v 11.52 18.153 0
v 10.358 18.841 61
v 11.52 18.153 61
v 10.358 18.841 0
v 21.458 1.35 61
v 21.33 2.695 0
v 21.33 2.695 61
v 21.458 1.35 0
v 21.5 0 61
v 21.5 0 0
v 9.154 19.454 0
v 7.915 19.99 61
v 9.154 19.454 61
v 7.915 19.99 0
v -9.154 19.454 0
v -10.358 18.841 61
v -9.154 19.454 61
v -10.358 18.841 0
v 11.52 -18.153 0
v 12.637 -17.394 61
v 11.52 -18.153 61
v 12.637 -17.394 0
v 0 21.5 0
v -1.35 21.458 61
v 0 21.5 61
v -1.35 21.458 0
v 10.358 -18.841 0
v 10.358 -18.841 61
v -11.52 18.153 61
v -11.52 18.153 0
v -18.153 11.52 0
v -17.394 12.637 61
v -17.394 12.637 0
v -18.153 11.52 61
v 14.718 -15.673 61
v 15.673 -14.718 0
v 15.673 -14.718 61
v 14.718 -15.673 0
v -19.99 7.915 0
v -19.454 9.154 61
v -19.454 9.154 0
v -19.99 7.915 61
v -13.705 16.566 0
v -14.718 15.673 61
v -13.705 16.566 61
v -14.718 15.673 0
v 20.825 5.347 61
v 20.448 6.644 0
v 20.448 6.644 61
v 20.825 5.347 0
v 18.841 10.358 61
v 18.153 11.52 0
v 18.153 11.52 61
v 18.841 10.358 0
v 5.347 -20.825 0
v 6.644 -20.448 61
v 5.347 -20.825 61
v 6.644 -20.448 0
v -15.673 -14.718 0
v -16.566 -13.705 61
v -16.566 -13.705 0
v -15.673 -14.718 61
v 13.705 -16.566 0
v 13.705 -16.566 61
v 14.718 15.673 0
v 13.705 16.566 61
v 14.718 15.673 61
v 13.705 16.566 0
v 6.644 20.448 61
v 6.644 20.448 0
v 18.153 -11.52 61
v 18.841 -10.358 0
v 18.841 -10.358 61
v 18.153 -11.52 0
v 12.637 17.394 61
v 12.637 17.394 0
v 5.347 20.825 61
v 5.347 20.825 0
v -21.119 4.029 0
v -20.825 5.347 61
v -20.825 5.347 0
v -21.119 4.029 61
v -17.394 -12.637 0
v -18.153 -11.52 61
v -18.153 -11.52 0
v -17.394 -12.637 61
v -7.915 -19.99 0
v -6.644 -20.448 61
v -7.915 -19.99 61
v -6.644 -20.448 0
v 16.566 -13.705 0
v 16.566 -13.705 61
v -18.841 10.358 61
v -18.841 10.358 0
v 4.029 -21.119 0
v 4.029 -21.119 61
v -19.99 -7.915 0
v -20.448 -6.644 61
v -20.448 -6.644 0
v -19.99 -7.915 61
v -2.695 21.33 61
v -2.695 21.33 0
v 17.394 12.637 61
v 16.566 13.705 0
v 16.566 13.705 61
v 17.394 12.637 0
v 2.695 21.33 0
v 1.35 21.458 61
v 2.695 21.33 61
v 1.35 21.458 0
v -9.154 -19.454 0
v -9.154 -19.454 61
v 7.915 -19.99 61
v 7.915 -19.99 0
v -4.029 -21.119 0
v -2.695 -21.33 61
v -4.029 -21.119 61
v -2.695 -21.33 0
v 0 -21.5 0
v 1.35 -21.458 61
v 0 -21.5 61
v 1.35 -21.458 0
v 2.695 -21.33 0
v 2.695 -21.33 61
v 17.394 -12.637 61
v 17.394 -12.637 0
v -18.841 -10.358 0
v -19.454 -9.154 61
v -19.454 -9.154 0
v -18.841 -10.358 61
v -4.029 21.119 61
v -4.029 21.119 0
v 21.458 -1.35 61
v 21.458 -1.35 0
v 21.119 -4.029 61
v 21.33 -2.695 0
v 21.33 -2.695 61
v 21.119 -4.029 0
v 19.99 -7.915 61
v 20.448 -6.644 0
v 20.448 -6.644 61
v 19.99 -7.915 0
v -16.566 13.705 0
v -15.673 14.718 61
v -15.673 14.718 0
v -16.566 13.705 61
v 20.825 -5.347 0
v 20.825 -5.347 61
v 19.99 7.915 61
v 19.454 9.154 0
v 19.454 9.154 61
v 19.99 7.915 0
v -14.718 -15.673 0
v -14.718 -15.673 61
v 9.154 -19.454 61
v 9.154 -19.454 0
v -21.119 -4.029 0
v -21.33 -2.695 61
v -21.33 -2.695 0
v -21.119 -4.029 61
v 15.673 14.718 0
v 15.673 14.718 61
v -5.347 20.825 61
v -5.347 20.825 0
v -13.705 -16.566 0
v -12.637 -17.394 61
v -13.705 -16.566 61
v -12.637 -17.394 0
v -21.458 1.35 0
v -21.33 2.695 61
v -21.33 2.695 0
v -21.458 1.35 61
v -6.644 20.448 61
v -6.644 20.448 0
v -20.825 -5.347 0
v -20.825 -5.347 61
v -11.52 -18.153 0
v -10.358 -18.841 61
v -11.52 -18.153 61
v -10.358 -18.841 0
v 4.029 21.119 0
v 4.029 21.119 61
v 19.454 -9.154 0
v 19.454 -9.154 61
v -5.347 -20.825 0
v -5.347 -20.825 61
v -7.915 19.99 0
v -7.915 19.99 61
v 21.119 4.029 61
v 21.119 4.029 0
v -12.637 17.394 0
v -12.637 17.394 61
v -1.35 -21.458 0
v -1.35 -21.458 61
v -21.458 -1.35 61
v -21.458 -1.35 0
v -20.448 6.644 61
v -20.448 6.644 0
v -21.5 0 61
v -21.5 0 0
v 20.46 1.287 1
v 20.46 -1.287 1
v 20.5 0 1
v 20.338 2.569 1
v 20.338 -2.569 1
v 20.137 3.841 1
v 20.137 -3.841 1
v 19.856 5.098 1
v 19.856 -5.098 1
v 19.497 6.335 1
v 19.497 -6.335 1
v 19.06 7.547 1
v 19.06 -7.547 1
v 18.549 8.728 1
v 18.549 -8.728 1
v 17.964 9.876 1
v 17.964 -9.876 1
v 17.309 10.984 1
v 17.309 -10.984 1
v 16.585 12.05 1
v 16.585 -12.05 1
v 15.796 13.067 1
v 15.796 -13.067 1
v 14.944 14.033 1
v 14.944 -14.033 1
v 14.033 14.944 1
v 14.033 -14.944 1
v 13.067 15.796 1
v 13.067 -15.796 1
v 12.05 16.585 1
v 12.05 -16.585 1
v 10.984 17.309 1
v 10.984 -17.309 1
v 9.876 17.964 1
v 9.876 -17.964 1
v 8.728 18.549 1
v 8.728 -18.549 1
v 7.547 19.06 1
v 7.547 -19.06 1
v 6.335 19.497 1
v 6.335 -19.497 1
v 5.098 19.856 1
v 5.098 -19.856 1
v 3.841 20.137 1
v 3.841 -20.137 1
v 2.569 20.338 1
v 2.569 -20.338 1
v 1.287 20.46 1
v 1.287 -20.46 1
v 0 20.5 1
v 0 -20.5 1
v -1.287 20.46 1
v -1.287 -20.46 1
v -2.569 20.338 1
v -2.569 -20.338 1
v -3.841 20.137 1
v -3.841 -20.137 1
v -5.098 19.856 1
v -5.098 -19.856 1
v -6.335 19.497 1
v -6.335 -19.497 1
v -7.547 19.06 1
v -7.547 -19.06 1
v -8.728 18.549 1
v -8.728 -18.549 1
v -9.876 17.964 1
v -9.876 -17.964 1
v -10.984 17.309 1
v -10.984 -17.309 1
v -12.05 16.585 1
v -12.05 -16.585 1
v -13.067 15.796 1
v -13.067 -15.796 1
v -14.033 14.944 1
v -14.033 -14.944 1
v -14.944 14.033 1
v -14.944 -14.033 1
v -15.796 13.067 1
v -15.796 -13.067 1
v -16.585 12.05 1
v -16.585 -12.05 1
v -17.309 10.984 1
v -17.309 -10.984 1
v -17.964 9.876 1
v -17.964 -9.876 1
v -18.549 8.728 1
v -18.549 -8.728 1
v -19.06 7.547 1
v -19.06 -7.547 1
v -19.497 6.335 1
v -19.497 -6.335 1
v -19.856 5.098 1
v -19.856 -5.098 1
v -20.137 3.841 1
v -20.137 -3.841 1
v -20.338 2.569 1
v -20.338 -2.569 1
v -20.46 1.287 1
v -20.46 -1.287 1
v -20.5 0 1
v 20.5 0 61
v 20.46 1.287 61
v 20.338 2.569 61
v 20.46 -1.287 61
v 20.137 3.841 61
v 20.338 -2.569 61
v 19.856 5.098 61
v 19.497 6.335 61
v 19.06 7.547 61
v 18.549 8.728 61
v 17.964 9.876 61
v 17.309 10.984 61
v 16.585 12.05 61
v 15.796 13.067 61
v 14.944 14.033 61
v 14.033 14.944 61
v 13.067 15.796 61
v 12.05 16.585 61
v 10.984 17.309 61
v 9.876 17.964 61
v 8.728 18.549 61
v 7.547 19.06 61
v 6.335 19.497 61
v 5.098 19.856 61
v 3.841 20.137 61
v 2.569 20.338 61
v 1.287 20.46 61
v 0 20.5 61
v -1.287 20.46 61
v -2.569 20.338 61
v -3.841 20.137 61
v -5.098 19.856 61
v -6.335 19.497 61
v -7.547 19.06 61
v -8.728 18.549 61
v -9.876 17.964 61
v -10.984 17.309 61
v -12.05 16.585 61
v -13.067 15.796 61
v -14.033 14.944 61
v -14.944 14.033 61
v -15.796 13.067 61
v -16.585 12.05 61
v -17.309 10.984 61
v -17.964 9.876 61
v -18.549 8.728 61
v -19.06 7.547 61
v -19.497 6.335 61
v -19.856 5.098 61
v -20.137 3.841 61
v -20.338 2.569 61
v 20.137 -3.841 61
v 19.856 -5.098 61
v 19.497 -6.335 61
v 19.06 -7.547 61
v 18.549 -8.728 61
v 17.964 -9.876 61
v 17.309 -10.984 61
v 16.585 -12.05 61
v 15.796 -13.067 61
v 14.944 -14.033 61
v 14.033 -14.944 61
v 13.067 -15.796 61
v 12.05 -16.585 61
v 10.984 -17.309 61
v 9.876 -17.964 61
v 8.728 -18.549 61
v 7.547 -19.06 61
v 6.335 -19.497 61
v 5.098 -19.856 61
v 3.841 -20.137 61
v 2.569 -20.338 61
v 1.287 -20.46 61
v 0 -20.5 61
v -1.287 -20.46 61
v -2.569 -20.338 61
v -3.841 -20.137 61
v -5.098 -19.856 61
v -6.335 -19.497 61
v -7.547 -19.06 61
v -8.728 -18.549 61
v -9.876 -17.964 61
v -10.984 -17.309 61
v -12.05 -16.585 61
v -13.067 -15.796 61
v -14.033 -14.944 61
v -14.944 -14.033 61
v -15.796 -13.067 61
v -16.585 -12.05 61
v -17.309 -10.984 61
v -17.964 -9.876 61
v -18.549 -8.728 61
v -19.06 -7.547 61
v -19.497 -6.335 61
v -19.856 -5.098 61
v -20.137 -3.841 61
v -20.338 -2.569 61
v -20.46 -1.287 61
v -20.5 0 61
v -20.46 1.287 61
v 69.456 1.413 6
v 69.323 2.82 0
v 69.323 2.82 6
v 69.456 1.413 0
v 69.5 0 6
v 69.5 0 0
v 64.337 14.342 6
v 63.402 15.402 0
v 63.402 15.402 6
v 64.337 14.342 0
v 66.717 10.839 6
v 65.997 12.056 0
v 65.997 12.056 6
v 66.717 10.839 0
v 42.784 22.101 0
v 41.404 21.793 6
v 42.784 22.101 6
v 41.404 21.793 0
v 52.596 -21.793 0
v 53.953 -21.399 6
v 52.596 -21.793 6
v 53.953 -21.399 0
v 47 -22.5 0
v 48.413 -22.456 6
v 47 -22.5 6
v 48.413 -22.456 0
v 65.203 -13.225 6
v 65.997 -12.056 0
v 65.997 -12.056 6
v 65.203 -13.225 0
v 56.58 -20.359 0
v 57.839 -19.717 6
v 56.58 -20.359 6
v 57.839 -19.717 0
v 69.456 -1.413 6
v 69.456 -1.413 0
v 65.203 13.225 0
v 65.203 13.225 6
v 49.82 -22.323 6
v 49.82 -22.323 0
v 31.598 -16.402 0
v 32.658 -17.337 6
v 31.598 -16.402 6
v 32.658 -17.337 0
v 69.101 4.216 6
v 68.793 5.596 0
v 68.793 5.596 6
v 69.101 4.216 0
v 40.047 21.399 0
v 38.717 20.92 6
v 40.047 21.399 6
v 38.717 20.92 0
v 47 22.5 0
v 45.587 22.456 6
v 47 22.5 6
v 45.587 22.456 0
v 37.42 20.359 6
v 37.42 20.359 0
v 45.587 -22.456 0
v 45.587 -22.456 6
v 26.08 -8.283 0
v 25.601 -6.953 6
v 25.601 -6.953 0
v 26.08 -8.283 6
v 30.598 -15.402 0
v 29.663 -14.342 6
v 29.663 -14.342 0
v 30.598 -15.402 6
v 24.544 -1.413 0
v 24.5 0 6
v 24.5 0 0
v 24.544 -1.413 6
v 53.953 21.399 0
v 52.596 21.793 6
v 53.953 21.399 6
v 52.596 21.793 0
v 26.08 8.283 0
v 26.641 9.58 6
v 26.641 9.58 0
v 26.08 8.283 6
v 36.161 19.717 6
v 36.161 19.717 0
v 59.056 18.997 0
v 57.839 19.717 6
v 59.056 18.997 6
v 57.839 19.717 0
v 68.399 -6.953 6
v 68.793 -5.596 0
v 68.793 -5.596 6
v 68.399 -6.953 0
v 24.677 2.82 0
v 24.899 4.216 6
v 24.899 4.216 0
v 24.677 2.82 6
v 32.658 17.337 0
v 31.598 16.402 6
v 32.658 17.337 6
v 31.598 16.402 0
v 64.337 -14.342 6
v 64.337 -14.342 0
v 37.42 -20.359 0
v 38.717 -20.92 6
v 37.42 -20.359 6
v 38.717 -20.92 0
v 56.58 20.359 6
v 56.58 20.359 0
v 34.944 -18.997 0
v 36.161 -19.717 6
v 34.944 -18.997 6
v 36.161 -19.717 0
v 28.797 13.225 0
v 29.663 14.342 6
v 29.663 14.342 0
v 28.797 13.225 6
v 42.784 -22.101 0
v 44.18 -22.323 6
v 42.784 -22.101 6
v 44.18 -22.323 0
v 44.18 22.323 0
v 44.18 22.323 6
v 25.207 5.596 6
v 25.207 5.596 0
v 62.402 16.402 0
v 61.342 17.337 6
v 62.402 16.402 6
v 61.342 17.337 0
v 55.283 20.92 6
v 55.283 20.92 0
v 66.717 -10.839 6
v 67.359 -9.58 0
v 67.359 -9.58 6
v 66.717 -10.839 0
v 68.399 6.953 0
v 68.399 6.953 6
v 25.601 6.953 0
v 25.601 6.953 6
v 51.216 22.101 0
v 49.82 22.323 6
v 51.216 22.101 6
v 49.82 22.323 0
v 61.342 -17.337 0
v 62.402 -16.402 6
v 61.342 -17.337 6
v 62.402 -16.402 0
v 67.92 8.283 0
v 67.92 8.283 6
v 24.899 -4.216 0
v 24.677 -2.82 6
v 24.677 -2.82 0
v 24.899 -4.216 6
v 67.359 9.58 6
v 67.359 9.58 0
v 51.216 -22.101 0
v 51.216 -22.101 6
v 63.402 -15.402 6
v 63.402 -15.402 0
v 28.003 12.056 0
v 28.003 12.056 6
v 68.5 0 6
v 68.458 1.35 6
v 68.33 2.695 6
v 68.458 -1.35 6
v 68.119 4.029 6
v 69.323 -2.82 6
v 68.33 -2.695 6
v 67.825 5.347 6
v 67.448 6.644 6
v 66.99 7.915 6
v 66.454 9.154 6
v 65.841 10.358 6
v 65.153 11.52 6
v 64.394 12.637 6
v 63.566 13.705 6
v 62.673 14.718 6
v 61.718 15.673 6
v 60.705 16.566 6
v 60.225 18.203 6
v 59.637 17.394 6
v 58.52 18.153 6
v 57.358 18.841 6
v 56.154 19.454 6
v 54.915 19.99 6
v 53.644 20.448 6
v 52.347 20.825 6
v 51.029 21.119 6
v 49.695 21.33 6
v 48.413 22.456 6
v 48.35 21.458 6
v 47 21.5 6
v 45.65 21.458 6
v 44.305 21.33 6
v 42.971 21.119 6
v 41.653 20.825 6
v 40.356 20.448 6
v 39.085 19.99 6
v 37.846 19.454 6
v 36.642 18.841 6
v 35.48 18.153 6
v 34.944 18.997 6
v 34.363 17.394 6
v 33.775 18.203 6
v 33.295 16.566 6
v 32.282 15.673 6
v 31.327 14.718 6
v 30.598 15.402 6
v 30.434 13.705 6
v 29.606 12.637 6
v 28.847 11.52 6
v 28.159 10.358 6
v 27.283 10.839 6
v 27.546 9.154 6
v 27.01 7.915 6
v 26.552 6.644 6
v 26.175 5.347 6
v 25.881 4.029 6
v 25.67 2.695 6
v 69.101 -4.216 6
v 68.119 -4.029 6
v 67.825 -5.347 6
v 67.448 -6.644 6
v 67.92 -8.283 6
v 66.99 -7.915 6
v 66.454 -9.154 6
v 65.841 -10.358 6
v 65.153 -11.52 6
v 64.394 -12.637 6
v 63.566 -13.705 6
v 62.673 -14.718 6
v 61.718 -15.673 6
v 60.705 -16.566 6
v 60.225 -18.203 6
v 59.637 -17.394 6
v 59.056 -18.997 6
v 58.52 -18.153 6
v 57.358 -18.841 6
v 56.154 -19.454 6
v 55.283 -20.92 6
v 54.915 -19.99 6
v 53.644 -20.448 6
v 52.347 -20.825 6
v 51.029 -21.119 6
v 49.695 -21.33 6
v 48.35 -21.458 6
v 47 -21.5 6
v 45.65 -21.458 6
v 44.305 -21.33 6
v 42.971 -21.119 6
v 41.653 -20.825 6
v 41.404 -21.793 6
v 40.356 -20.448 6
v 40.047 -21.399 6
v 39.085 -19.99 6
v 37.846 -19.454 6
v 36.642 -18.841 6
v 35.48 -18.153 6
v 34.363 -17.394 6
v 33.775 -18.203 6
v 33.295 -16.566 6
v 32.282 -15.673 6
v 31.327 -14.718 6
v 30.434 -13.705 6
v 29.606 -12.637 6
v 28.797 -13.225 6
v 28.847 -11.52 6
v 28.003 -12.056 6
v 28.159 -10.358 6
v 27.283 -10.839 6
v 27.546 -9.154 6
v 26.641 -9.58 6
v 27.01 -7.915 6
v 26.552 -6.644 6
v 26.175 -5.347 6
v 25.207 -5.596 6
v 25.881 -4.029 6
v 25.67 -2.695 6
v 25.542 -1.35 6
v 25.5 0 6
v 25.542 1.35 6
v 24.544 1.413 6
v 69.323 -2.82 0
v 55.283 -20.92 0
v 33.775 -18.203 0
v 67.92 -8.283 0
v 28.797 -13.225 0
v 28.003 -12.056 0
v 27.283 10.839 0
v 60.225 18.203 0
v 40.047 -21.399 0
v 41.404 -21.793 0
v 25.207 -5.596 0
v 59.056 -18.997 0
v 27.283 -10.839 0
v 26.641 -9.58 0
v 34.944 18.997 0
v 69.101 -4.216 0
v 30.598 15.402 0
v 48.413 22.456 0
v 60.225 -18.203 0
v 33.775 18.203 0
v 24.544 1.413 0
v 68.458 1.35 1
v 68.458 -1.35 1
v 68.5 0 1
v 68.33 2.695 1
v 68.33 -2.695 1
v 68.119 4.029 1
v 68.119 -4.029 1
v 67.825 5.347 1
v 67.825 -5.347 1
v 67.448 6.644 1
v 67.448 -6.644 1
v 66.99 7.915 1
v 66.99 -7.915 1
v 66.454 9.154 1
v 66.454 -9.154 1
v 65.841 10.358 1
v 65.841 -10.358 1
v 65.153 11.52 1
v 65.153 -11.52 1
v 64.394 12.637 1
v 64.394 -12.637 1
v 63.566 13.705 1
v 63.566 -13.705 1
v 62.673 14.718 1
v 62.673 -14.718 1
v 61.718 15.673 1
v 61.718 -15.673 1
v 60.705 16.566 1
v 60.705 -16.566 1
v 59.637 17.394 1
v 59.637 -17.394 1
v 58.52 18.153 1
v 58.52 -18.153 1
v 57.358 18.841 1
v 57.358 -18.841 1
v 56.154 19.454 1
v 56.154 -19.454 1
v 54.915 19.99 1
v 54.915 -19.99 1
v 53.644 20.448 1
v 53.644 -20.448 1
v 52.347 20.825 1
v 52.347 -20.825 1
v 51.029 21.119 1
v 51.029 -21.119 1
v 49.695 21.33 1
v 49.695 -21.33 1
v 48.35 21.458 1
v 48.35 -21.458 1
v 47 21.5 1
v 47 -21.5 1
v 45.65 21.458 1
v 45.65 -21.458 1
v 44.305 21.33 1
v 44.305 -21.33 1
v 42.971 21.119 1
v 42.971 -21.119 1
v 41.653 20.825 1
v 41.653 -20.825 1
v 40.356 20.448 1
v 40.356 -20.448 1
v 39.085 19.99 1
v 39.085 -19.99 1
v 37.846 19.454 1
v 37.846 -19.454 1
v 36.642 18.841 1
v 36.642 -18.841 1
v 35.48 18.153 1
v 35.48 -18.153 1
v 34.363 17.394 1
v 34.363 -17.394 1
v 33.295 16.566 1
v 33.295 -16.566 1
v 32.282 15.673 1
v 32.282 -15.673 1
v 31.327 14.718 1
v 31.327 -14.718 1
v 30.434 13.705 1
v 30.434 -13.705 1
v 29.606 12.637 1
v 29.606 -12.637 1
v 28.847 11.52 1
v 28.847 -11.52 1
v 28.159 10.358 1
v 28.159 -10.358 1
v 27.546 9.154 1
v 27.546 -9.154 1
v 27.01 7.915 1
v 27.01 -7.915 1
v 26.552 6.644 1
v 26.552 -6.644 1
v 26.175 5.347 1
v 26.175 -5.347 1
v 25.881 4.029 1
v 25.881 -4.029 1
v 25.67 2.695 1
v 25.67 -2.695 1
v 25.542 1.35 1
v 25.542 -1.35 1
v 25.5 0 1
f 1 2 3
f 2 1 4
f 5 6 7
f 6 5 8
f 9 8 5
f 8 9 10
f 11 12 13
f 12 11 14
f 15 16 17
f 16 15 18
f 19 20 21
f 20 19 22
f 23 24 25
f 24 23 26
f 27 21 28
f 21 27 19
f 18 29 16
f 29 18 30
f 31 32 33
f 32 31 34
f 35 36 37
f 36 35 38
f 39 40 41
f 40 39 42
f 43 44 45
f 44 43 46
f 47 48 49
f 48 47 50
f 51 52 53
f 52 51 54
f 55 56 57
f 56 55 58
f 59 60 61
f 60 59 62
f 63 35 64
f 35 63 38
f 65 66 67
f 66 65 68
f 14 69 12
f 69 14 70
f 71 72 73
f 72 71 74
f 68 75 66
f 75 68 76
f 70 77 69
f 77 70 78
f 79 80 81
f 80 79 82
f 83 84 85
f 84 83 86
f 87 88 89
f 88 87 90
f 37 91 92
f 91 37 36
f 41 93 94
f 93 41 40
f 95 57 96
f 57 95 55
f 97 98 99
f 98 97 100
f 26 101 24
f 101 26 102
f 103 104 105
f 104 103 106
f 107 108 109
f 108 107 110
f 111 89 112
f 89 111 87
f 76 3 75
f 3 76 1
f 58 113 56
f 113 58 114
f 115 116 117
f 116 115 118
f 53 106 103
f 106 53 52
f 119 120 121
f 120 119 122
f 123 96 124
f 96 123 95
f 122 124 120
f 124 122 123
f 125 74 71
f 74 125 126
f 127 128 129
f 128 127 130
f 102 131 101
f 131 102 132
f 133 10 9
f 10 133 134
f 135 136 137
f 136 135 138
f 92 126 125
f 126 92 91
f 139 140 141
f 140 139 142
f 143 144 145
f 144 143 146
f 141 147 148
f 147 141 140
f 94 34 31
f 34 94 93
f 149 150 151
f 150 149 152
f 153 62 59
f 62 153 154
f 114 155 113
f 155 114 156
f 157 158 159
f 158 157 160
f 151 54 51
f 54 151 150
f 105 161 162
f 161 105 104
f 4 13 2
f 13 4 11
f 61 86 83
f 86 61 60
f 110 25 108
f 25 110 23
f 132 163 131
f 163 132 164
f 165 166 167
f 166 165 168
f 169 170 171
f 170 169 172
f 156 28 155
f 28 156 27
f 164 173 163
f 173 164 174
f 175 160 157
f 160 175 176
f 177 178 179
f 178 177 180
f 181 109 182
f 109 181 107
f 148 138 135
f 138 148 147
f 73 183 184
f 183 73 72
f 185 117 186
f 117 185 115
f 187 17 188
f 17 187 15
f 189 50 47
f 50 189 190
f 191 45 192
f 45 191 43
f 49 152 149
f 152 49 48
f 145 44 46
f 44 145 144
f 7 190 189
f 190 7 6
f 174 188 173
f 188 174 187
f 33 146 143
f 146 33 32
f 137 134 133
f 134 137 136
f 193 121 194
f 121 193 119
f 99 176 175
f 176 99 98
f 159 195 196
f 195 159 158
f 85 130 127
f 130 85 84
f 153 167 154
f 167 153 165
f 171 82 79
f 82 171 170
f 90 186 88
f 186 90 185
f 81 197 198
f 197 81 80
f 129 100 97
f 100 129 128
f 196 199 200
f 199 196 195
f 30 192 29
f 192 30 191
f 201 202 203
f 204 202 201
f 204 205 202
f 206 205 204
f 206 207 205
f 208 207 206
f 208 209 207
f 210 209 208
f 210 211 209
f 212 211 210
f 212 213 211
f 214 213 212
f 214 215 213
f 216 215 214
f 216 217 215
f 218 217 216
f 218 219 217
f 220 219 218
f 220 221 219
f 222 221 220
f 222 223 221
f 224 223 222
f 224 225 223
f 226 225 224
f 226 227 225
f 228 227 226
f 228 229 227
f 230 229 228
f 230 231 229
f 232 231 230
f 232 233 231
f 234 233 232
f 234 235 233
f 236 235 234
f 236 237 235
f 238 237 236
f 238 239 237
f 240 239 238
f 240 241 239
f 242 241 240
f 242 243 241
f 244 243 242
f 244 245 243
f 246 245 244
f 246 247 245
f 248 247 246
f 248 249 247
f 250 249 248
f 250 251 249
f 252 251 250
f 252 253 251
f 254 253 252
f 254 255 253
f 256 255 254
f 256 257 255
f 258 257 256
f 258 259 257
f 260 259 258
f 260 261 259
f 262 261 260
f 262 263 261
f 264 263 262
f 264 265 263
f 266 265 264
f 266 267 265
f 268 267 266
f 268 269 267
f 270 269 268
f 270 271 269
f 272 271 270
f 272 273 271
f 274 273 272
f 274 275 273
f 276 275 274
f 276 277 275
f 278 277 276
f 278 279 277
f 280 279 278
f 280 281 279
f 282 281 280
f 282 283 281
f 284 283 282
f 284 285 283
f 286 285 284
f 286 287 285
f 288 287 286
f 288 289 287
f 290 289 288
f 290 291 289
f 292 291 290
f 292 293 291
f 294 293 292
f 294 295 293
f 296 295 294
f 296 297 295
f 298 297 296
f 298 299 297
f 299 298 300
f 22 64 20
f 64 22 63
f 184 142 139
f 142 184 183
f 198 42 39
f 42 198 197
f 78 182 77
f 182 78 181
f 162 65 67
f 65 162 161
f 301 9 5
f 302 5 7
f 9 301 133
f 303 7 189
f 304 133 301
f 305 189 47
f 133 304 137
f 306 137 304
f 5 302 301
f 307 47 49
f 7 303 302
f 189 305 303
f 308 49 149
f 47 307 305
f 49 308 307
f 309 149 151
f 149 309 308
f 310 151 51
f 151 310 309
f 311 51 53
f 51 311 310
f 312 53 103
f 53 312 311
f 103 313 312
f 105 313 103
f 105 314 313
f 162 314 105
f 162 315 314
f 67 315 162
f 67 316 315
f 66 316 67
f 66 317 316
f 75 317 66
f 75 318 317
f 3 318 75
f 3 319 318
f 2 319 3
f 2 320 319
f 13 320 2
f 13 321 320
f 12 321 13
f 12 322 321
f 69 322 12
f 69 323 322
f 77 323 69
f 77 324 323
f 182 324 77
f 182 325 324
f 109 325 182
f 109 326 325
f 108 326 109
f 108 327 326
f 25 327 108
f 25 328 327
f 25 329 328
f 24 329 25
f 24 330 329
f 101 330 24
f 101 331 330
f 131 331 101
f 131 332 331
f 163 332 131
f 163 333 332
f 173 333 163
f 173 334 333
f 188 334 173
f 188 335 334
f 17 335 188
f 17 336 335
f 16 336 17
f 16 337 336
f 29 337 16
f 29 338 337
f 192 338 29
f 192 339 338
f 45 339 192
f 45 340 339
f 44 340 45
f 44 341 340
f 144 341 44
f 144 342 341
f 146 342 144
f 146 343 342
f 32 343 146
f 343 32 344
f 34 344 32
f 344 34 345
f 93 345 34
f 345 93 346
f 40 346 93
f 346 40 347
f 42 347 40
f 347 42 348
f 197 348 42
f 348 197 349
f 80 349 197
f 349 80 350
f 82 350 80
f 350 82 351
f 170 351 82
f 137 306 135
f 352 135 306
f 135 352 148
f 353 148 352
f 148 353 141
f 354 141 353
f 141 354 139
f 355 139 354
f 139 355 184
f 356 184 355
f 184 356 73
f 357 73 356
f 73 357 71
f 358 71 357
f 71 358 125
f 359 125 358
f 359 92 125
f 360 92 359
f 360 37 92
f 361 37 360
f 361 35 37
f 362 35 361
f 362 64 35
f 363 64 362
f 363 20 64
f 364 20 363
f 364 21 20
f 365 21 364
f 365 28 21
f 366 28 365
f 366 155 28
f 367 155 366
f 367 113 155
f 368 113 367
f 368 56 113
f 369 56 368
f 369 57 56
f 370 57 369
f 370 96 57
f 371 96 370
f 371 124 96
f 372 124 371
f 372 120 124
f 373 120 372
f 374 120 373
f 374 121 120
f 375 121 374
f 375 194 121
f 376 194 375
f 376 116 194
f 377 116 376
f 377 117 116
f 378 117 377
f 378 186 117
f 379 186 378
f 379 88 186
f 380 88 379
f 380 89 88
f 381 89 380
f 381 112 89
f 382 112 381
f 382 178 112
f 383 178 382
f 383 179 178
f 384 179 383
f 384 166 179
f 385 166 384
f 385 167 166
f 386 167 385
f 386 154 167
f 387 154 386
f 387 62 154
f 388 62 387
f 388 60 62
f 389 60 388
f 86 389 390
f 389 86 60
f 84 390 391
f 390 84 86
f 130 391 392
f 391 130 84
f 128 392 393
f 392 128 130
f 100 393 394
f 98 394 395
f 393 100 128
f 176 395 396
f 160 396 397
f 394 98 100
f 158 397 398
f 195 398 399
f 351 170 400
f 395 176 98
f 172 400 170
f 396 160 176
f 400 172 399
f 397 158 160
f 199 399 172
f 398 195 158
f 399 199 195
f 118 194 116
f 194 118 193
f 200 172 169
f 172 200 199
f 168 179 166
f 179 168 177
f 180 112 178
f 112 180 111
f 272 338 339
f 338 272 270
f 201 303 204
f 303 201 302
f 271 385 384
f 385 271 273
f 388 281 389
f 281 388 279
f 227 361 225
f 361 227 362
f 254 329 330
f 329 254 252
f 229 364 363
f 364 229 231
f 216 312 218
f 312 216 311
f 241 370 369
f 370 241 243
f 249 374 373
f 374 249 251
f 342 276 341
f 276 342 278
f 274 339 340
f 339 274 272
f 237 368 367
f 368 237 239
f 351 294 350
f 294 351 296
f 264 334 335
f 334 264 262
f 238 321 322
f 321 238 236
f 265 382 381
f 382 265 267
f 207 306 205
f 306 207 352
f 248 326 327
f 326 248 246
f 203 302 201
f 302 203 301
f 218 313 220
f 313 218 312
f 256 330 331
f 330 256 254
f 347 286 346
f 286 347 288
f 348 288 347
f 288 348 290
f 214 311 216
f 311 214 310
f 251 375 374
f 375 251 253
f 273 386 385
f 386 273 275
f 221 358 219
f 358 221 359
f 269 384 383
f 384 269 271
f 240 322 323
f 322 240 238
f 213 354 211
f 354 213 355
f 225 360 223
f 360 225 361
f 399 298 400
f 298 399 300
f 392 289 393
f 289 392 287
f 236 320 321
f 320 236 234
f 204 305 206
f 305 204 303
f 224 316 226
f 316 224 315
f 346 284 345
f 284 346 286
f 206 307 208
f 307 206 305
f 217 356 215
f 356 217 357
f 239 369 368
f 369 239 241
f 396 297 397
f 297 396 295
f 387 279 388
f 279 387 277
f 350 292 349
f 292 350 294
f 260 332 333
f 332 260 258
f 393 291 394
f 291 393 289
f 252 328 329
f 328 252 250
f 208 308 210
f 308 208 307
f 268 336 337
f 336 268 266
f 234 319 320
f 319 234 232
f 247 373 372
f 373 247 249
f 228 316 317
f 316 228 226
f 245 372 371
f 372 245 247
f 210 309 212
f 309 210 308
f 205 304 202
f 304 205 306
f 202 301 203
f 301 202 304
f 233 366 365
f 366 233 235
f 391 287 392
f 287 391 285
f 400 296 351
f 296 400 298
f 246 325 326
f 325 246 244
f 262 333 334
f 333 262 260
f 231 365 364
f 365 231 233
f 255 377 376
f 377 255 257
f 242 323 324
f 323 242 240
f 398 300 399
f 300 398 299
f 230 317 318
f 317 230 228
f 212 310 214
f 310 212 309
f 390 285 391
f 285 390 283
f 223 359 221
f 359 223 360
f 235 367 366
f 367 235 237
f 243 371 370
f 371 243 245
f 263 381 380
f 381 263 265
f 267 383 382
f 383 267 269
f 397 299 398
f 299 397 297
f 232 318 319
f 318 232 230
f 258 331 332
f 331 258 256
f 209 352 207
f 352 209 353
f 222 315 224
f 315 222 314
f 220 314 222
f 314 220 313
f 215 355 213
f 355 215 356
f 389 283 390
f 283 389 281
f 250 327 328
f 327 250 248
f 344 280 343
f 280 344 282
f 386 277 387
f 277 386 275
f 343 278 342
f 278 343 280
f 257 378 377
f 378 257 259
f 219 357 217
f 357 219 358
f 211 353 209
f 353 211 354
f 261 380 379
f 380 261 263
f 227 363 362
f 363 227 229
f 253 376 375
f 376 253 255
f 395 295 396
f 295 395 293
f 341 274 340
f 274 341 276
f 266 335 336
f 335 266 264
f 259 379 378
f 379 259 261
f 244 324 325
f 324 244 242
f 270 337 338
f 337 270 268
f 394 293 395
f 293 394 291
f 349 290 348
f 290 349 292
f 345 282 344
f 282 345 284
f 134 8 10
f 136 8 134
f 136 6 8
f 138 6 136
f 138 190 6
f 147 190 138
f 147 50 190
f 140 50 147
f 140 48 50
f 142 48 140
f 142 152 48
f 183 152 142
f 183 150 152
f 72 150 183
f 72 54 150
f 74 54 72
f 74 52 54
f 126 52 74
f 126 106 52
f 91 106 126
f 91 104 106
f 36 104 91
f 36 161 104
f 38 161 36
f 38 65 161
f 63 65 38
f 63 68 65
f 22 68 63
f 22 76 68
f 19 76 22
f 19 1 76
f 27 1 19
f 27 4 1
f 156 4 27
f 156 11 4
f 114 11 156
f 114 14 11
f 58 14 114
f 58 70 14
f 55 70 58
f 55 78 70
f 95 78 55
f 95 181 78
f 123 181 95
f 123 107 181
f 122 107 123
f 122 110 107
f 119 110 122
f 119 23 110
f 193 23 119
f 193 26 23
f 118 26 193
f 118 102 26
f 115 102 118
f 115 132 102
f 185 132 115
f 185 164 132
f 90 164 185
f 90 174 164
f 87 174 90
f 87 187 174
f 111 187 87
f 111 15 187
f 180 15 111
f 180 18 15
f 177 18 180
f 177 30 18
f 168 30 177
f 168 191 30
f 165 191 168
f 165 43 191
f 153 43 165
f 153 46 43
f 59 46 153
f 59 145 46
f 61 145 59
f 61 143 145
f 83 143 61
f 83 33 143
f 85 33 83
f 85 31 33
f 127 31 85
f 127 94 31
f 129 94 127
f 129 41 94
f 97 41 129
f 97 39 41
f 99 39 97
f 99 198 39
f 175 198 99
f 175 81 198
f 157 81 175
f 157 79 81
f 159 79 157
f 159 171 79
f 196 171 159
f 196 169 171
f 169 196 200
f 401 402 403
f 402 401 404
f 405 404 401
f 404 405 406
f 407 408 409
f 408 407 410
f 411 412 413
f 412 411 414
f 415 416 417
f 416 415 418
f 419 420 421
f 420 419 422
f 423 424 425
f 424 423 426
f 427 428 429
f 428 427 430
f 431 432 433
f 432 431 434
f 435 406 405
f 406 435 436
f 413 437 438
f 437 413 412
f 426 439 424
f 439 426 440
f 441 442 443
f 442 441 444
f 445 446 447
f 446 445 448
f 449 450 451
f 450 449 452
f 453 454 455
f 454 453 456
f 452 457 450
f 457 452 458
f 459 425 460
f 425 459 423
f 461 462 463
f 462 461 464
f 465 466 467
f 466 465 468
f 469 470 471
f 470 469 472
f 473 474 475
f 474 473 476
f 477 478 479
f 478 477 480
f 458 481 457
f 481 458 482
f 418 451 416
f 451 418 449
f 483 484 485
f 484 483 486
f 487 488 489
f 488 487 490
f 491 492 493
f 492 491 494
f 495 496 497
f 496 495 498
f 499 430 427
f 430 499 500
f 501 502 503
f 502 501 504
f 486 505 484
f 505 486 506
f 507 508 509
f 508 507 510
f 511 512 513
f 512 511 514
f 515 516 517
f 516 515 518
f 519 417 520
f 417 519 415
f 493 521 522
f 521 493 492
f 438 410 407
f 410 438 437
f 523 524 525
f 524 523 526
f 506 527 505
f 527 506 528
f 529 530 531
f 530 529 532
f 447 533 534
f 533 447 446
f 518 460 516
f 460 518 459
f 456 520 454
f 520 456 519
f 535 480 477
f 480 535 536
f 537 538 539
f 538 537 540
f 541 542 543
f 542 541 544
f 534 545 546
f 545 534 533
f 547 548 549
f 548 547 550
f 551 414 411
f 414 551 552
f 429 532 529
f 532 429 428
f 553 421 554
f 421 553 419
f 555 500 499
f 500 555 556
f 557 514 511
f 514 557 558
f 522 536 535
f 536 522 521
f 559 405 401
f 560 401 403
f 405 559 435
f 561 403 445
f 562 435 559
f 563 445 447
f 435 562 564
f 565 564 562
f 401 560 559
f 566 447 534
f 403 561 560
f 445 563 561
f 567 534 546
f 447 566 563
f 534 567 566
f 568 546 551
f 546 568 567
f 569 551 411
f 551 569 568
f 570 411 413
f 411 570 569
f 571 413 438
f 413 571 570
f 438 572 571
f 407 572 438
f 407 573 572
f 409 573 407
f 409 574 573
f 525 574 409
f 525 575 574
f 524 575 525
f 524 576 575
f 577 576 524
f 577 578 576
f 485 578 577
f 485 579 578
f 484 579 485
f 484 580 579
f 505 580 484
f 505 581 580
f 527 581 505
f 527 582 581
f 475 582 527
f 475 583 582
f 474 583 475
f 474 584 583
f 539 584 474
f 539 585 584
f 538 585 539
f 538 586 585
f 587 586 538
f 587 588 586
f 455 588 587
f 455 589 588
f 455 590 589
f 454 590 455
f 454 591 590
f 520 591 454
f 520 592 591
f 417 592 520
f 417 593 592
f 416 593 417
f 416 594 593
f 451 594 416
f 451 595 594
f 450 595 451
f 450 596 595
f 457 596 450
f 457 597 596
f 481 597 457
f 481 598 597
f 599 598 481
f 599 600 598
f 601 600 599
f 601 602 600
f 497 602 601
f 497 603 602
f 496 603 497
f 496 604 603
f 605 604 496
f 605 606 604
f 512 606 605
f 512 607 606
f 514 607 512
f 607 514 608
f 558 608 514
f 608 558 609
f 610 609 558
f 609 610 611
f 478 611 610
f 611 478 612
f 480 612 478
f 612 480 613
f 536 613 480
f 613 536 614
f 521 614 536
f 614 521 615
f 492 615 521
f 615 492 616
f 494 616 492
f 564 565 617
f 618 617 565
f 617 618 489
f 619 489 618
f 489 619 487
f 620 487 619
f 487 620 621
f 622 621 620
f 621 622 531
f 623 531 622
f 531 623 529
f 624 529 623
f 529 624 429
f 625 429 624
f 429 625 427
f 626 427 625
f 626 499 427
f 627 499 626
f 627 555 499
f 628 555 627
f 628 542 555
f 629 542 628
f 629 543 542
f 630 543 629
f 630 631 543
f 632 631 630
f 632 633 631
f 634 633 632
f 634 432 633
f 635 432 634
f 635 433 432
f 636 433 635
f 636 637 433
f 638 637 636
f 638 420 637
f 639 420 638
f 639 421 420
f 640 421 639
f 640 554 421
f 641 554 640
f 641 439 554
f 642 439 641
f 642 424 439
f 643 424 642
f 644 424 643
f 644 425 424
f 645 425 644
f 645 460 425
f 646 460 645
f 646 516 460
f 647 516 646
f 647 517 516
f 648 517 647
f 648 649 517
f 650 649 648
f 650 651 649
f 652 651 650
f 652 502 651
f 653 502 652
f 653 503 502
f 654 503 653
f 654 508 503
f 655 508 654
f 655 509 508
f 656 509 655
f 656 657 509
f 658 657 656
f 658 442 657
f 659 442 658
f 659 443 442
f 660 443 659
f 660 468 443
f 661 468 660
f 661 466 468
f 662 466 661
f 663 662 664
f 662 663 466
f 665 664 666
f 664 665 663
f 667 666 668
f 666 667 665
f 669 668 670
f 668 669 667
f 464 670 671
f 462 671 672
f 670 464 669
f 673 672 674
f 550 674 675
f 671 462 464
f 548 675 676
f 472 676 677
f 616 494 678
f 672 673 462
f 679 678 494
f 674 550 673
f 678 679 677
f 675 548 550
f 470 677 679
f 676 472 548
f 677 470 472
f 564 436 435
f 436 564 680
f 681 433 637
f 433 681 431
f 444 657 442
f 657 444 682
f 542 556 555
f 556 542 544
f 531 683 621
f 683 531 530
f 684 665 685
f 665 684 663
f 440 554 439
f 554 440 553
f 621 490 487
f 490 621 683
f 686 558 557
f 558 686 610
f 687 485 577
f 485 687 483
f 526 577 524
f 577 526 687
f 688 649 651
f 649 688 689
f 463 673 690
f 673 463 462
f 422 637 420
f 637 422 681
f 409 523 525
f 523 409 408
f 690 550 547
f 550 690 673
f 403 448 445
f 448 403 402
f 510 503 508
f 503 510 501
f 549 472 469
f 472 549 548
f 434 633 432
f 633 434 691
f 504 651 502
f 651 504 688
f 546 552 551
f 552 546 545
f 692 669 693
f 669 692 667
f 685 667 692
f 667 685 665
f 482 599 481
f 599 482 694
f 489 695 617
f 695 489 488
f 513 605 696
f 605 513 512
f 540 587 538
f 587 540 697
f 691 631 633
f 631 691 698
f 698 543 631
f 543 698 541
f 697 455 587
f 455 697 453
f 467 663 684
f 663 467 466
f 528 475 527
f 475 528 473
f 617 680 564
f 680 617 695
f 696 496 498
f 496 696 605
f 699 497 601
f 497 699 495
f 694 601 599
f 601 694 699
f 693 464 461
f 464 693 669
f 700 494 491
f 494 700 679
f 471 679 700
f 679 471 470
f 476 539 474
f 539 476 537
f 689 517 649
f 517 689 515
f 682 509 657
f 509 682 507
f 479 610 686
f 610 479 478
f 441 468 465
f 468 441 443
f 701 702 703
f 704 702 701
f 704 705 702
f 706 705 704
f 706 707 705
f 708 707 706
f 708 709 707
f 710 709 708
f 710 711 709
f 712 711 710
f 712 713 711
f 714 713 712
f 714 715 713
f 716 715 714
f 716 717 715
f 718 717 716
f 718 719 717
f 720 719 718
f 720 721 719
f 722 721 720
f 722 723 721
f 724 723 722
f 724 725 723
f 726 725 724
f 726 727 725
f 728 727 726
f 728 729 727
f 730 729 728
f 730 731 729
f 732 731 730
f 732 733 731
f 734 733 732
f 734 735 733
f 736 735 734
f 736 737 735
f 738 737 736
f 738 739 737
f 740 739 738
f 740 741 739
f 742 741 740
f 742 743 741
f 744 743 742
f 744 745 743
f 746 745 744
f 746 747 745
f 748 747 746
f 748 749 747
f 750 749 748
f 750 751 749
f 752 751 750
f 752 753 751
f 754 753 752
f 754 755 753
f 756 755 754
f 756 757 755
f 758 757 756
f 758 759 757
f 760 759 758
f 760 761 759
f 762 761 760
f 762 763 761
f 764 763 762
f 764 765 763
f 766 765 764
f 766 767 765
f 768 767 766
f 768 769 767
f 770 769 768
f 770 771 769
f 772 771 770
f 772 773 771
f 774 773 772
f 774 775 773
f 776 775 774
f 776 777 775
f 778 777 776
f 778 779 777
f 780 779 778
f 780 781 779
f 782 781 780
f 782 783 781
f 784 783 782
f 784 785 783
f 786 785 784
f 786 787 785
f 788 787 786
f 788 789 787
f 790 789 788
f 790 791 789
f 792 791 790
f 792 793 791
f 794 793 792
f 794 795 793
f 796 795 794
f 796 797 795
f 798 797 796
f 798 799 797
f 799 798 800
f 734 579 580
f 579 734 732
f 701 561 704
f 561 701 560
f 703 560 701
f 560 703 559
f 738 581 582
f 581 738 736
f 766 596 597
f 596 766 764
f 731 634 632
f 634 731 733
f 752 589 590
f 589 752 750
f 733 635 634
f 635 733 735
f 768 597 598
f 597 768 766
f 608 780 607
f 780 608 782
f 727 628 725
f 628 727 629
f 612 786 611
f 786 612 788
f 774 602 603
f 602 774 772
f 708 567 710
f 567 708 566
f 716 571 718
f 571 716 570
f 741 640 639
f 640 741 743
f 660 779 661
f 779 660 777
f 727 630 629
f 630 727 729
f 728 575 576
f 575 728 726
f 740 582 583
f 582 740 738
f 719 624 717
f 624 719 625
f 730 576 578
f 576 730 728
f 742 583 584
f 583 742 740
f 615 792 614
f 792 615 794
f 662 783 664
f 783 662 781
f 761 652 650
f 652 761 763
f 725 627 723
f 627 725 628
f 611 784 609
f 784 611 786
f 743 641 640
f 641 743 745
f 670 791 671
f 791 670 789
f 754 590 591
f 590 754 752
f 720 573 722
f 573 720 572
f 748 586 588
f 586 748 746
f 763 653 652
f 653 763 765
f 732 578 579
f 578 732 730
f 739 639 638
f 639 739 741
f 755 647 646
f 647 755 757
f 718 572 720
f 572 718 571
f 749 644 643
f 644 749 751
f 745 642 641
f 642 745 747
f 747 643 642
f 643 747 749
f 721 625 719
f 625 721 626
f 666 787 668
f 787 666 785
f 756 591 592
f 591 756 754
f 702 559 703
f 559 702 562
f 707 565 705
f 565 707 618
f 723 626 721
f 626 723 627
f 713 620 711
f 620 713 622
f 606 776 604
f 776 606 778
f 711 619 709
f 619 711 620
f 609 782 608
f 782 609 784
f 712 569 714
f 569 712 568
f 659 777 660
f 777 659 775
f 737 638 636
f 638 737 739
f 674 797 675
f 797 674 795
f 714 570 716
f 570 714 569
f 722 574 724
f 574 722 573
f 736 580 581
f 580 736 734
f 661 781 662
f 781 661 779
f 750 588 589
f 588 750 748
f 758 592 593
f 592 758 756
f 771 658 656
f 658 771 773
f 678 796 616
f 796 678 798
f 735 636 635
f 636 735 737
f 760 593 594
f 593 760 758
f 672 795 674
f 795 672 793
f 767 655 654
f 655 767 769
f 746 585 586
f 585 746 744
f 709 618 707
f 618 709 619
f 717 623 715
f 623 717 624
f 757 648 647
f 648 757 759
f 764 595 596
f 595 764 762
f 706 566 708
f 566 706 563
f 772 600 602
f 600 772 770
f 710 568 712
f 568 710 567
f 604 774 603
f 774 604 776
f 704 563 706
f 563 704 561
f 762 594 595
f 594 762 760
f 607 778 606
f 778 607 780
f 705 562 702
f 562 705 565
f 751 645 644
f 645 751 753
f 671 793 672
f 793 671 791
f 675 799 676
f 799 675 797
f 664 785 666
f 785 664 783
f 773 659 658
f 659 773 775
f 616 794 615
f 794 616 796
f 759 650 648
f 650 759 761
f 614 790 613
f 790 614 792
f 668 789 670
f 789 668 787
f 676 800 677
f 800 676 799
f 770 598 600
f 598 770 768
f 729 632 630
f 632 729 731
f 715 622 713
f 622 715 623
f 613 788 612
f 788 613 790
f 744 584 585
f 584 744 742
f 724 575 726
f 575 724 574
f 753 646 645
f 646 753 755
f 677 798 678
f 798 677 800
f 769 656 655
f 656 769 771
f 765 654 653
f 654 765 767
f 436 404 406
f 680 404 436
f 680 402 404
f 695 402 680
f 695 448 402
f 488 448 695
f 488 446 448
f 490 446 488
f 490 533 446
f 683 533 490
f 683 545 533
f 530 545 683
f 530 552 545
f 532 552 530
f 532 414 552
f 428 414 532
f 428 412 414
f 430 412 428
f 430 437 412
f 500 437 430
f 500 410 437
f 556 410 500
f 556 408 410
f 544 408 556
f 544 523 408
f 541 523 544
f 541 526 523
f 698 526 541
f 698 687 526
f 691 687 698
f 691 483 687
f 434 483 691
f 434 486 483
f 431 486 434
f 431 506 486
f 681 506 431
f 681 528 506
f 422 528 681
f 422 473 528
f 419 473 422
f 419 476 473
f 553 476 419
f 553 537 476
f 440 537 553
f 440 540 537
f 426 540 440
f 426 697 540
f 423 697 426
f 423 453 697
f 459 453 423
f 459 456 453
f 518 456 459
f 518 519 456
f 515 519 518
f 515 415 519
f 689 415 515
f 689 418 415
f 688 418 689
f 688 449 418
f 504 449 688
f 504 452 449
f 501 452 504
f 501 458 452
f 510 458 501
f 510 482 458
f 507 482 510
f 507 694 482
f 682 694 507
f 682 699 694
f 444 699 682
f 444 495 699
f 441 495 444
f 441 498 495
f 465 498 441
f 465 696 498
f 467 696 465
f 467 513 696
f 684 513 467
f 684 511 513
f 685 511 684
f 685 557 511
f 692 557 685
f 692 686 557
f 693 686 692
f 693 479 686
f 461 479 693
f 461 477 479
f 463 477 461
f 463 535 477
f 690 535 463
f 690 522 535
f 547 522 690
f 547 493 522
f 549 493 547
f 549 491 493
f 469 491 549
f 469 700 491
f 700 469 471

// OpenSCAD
/*  
**  Name:  Customizable American Coin Container_3d_model
**  Author:  Chris Benson  @TheExtruder
**  Created:  2/24/2017
*/
coin = "Silver Eagles" ; // [Pennies,Nickels,Dimes,Quarters,Silver Eagles]

numberOfCoins = 20; //[1:1:100]

/* [Hidden] */
$fn = 100;
capHeight = 5;
wallThickness = 1;

print_part();

module print_part() {
	if (coin == "Pennies") {
        CreateContainerAndCap(
            numberOfCoins = numberOfCoins,
            coinHeight = 1.54,
            coinDiameter = 19.07,
            wallThickness = wallThickness,
            capHeight = capHeight
        );
	} else if (coin == "Nickels") {
        CreateContainerAndCap(
            numberOfCoins = numberOfCoins,
            coinHeight = 1.97,
            coinDiameter = 21.23,
            wallThickness = wallThickness,
            capHeight = capHeight
        );
	} else if (coin == "Dimes") {
		CreateContainerAndCap(
            numberOfCoins = numberOfCoins,
            coinHeight = 1.37,
            coinDiameter = 17.93,
            wallThickness = wallThickness,
            capHeight = capHeight
        );
    } else if (coin == "Quarters") {
		CreateContainerAndCap(
            numberOfCoins = numberOfCoins,
            coinHeight = 1.77,
            coinDiameter = 24.28,
            wallThickness = wallThickness,
            capHeight = capHeight
        );
    } else if (coin == "Silver Eagles") {
		CreateContainerAndCap(
            numberOfCoins = numberOfCoins,
            coinHeight = 3,
            coinDiameter = 41,
            wallThickness = wallThickness,
            capHeight = capHeight
        );
	}
}

module CreateContainerAndCap(numberOfCoins, coinHeight, coinDiameter, wallThickness, capHeight){
    CreateCylinder(numberOfCoins * coinHeight, coinDiameter, wallThickness);
    translate([coinDiameter + wallThickness + 5,0,0])
        CreateCylinder(capHeight, coinDiameter + wallThickness * 2, wallThickness);
}

module CreateCylinder(height,innerDiameter,wallThinkness){
    union(){
        //bottom
        cylinder(wallThickness, d=innerDiameter + (wallThickness * 2), true);
        
        translate([0,0,wallThickness]){
            difference(){
                //outer wall
                cylinder(height, d=innerDiameter + (wallThickness * 2), true);
                //inner wall
                cylinder(height, d=innerDiameter, true);
            }
        }
    }
}
